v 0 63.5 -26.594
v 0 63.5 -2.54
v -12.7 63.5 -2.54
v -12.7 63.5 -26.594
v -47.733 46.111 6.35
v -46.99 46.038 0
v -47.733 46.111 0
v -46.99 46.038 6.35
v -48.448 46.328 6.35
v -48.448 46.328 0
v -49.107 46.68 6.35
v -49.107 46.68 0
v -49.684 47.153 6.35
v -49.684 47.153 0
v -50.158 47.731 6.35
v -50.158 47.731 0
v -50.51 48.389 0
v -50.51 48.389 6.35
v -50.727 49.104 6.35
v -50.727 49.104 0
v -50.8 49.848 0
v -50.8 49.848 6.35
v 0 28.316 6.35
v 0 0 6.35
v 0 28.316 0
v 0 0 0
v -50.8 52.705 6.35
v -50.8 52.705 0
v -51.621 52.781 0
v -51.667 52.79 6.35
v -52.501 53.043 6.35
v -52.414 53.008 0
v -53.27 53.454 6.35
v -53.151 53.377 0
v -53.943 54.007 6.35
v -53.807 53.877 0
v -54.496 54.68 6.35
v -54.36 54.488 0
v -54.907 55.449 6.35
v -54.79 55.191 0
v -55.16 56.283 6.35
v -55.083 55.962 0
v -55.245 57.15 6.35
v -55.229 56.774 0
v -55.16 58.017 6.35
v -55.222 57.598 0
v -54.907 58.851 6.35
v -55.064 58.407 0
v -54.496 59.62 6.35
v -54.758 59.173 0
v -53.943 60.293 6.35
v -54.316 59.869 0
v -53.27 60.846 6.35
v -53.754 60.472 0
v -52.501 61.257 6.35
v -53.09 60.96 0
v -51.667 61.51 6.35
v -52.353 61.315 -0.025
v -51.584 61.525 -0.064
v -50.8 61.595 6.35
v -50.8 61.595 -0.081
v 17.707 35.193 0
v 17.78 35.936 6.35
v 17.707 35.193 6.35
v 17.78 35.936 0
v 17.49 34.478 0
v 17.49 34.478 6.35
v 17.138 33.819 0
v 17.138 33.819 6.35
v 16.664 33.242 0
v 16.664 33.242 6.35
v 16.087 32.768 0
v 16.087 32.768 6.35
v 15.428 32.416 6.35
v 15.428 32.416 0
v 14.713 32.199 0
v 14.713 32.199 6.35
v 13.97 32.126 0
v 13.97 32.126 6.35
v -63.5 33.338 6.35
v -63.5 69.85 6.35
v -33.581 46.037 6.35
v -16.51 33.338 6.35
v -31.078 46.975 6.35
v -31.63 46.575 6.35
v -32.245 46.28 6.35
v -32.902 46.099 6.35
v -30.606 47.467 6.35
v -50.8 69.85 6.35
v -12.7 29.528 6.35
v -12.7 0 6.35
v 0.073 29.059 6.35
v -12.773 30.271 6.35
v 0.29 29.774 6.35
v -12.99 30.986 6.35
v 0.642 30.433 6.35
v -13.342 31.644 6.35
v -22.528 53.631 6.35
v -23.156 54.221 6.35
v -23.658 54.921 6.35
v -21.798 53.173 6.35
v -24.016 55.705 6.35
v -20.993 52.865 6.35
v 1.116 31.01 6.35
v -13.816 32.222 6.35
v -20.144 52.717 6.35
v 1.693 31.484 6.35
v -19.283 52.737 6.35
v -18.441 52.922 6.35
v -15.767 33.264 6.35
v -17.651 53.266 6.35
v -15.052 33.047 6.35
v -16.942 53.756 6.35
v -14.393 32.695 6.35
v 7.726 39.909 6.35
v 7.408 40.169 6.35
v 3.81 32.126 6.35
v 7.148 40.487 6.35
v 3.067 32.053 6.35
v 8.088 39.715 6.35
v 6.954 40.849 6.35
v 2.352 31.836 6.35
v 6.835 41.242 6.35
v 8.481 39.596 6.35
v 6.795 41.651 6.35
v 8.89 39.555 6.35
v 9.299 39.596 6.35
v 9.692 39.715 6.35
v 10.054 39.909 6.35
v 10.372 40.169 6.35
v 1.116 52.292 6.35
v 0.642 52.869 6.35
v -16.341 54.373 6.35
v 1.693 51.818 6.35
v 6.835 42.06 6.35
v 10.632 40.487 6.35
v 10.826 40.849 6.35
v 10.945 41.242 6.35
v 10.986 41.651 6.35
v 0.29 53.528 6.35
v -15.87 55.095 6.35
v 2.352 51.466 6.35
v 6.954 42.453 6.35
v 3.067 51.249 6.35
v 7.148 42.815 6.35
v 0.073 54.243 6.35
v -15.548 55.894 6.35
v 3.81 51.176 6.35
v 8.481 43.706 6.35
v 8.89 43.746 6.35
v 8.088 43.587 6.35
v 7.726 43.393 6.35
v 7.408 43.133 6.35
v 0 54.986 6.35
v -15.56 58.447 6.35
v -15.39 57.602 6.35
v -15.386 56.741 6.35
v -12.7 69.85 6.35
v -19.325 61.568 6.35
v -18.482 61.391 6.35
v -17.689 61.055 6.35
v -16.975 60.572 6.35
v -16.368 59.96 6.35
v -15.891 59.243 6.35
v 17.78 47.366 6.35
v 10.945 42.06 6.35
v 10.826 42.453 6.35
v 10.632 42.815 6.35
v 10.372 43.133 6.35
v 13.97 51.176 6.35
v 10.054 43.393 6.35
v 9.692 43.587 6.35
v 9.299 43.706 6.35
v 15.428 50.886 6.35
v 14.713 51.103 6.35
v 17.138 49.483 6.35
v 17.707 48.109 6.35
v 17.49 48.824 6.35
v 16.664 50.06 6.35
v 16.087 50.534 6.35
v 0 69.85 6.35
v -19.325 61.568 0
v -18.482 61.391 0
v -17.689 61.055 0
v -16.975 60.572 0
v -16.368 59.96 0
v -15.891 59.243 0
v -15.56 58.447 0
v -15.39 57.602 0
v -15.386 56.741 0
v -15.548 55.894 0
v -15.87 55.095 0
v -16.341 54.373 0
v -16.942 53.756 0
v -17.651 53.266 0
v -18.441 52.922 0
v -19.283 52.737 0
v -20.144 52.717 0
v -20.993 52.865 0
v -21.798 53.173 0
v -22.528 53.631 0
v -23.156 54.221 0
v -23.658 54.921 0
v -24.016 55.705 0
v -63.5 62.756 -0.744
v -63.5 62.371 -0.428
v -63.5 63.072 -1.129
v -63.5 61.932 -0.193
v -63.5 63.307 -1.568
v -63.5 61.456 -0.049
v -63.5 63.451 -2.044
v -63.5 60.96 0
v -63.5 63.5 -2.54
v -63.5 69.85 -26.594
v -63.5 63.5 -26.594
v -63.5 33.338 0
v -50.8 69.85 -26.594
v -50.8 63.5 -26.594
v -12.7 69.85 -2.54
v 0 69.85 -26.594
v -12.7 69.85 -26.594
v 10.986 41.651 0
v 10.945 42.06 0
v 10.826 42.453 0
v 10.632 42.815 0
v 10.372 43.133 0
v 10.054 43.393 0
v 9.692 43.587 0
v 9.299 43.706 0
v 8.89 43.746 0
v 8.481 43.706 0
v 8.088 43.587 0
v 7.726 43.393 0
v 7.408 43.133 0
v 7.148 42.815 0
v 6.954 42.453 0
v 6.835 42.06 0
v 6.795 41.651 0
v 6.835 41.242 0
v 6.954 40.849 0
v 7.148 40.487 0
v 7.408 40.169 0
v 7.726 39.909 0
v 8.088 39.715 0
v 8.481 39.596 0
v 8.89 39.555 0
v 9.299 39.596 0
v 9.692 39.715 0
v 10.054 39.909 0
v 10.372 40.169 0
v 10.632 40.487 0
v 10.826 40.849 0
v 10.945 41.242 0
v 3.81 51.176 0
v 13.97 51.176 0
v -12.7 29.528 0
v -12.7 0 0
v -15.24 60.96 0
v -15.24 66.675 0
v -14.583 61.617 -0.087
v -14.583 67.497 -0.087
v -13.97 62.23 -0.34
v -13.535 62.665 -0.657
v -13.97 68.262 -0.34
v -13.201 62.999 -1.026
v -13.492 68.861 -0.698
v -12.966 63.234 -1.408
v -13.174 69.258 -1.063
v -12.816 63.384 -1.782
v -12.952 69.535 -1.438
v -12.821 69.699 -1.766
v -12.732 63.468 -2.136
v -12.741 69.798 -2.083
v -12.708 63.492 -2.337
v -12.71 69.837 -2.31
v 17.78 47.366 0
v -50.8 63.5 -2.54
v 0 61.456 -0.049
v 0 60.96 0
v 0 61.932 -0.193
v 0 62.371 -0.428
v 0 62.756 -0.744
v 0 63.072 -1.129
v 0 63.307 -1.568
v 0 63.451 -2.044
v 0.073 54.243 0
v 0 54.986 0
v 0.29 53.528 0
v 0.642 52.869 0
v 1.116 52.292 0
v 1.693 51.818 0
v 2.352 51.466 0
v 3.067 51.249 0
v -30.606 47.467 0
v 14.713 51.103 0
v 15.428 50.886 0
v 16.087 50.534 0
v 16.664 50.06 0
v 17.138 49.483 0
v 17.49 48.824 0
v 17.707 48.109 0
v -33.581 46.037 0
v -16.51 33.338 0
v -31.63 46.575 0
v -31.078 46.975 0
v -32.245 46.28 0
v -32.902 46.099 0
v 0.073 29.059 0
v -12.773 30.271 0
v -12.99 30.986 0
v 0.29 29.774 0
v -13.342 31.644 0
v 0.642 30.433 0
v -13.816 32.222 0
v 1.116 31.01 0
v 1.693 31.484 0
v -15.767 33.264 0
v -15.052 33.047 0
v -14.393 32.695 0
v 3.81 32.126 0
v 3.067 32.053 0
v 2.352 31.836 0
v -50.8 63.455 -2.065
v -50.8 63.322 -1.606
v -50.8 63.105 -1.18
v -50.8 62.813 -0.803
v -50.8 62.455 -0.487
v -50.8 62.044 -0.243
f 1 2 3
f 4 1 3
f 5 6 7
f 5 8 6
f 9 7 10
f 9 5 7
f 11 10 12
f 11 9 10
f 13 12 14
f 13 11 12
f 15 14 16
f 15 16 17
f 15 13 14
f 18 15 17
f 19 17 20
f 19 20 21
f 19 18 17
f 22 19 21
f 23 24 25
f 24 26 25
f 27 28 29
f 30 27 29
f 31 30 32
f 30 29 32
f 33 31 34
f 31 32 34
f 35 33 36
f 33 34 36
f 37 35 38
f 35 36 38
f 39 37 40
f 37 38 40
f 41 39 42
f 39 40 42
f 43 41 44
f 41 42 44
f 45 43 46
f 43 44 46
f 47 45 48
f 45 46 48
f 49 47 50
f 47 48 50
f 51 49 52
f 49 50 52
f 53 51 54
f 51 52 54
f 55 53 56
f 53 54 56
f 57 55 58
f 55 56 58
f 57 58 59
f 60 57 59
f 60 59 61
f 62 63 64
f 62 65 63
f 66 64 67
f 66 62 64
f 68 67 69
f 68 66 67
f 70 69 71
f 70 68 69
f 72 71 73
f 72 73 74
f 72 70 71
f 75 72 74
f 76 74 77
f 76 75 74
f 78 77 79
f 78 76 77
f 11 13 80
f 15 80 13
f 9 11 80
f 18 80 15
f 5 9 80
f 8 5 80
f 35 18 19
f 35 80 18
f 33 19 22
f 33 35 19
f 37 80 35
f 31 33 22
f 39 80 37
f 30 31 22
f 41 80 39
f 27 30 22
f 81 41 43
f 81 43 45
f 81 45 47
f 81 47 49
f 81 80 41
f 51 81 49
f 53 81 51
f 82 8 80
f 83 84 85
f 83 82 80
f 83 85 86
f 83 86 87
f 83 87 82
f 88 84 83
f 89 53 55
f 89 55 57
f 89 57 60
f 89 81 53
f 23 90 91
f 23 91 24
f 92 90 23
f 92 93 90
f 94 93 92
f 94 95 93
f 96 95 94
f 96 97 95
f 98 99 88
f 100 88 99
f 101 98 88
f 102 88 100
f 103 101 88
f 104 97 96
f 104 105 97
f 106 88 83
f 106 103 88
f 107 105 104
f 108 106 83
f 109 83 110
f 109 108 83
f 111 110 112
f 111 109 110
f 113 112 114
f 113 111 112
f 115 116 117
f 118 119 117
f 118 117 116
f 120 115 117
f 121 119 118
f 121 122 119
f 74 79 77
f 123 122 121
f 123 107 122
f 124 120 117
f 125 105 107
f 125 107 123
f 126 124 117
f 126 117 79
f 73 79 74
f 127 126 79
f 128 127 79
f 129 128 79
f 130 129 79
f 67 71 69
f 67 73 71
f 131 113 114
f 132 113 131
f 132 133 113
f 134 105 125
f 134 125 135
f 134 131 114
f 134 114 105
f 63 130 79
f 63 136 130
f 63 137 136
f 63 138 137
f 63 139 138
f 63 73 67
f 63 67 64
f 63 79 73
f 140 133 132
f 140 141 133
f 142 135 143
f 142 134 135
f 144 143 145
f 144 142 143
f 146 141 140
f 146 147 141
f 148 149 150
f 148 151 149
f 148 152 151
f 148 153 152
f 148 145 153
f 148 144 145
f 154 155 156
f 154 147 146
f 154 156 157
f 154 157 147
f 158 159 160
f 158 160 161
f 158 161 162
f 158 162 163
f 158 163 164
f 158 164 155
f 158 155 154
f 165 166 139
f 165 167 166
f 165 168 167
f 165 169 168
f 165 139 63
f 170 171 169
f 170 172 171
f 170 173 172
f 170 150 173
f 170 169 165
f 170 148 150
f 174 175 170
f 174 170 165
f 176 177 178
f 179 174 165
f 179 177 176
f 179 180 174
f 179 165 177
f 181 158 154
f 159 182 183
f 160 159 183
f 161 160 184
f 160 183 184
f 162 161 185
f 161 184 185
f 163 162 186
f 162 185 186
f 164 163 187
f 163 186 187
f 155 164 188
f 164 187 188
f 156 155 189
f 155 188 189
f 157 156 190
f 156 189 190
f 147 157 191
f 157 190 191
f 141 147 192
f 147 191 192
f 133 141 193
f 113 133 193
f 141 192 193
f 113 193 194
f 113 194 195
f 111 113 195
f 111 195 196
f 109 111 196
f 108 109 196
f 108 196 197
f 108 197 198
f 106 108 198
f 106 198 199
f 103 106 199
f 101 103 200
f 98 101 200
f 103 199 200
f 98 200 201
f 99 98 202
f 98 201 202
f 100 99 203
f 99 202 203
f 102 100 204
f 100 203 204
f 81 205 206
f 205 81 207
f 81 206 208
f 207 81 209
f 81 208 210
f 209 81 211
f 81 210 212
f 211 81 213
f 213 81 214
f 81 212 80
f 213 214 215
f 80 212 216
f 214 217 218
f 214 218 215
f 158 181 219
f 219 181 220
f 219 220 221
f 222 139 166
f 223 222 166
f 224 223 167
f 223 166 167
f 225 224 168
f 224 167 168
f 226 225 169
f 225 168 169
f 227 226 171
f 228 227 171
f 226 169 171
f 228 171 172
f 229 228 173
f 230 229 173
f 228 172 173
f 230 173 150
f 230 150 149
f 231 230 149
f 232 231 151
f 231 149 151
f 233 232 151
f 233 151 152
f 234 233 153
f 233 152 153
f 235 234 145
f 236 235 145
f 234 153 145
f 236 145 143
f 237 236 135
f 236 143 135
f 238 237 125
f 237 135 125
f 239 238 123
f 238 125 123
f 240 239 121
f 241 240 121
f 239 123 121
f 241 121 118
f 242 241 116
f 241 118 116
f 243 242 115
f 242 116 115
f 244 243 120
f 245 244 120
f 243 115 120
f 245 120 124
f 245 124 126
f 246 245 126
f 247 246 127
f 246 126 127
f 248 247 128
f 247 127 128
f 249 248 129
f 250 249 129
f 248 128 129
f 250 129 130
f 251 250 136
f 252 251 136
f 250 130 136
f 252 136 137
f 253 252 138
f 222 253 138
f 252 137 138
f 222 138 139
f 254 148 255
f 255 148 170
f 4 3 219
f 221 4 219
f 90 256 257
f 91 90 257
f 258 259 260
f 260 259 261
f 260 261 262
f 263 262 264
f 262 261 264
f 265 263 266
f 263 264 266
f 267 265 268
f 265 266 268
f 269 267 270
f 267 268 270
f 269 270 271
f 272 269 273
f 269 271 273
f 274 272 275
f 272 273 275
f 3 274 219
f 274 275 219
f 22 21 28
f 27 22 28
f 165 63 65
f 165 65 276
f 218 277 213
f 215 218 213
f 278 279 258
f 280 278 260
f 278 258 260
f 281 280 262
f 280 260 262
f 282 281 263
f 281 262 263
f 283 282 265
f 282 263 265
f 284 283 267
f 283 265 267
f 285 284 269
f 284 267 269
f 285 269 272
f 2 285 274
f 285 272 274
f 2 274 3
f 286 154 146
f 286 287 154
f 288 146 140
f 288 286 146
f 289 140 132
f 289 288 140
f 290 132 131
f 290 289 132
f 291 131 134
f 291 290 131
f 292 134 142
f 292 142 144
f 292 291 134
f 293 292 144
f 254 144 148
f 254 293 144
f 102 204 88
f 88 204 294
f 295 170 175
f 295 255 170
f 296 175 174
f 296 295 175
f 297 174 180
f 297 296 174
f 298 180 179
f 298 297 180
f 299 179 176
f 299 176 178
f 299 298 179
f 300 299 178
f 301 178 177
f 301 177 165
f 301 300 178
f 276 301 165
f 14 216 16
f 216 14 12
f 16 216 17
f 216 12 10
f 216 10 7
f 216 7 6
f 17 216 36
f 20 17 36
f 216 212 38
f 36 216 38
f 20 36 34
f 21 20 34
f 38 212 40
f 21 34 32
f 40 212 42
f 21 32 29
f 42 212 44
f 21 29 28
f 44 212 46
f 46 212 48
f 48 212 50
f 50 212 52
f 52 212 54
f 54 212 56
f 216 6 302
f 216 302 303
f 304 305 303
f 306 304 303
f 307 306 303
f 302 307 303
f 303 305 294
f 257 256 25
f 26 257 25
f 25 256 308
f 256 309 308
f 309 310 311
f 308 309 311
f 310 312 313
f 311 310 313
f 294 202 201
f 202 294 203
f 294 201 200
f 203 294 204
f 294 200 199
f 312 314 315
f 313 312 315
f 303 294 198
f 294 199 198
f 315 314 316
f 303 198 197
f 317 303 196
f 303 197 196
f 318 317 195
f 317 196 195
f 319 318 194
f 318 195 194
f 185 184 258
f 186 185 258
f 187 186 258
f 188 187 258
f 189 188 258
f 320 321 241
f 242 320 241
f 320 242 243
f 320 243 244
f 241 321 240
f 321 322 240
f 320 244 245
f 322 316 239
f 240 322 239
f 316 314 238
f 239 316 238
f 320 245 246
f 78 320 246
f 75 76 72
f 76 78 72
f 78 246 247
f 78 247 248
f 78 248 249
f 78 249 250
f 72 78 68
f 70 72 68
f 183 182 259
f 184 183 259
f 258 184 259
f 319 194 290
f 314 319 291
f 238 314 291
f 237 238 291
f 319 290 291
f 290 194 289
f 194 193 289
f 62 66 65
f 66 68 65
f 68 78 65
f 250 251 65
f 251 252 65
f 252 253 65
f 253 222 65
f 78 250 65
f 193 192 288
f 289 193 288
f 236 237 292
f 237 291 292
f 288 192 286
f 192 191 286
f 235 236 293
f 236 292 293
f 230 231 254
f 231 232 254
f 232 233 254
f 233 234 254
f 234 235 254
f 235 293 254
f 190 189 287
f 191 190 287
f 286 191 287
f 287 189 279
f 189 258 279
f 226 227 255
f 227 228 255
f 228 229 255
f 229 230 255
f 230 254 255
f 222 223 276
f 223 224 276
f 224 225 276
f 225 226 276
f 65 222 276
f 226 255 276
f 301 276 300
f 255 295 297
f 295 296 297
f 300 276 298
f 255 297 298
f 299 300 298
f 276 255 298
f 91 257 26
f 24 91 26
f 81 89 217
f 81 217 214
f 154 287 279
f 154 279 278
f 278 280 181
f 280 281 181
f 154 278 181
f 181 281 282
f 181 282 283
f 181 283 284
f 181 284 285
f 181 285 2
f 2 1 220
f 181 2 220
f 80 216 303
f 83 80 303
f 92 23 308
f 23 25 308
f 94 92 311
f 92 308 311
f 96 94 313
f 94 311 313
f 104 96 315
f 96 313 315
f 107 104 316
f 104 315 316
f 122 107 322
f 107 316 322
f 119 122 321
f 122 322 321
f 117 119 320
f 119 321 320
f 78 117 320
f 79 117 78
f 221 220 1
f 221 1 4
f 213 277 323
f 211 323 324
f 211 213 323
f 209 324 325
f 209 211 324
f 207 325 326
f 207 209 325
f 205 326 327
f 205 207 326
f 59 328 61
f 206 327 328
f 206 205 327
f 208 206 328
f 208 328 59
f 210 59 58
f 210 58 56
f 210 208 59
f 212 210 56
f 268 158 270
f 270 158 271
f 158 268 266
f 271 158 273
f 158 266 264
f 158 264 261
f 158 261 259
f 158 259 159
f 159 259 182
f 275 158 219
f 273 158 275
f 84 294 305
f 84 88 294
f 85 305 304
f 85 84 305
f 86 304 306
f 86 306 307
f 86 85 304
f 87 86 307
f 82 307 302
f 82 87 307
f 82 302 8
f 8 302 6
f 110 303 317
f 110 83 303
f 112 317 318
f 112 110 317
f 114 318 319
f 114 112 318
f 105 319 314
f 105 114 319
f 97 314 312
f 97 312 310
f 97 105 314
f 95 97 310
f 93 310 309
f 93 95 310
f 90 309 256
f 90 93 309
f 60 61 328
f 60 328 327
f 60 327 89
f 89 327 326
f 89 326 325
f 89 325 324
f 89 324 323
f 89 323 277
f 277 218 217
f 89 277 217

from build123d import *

# Parameters (mm, degrees)
BOSS_EXTRUDE1_DEPTH = 6.35
SKETCH2_W           = 12.7
SKETCH2_H           = 6.35
BOSS_EXTRUDE3_DEPTH = 32.9438
FILLET1_R           = 2.54
SKETCH3_W           = 17.78
SKETCH3_H           = 19.05
SKETCH3_R           = 2.0955
BOSS_EXTRUDE4_DEPTH = 6.35
FILLET2_R           = 3.81


with BuildPart() as part:
    # Sketch1 → Boss-Extrude1 (new body)
    with BuildSketch(Plane.XY):
        with BuildLine():
            Line((0, 0), (0, 69.85))
            Line((0, 69.85), (-12.7, 69.85))
            Line((-12.7, 69.85), (-19.325374009, 61.568282488))
            ThreePointArc((-19.325374009, 61.568282488), (-16.341038142, 54.373230514), (-24.015699161, 55.705376048))
            Line((-24.015699161, 55.705376048), (-31.75, 46.0375))
            Line((-31.75, 46.0375), (-50.8, 46.0375))
            Line((-50.8, 46.0375), (-50.8, 52.705))
            ThreePointArc((-50.8, 52.705), (-55.245, 57.15), (-50.8, 61.595))
            Line((-50.8, 61.595), (-50.8, 69.85))
            Line((-50.8, 69.85), (-63.5, 69.85))
            Line((-63.5, 69.85), (-63.5, 33.3375))
            Line((-63.5, 33.3375), (-12.7, 33.3375))
            Line((-12.7, 33.3375), (-12.7, 0))
            Line((-12.7, 0), (0, 0))
        make_face()
    extrude(amount=BOSS_EXTRUDE1_DEPTH)

    # Sketch2 → Boss-Extrude3 (add)
    with BuildSketch(Plane(origin=(0, 0, 6.35), x_dir=(-1, 0, 0), z_dir=(0, 0, -1))):
        with Locations((6.35, 66.675)):
            Rectangle(SKETCH2_W, SKETCH2_H)
        with Locations((57.15, 66.675)):
            Rectangle(SKETCH2_W, SKETCH2_H)
    extrude(amount=BOSS_EXTRUDE3_DEPTH)

    # Fillet1
    fillet1_edges = [part.edges().sort_by_distance(p)[0] for p in [
        (-57.15, 63.5, 0),
        (-6.35, 63.5, 0),
        (-12.7, 66.675, 0),
    ]]
    fillet(fillet1_edges, radius=FILLET1_R)

    # Sketch3 → Boss-Extrude4 (add)
    with BuildSketch(Plane.XY.offset(6.35)):
        with Locations((8.89, 41.65092)):
            Rectangle(SKETCH3_W, SKETCH3_H)
        with Locations((8.89, 41.65092)):
            Circle(SKETCH3_R, mode=Mode.SUBTRACT)
    extrude(amount=-BOSS_EXTRUDE4_DEPTH)

    # Fillet2
    fillet2_edges = [part.edges().sort_by_distance(p)[0] for p in [
        (17.78, 32.12592, 3.175),
        (17.78, 51.17592, 3.175),
        (0, 51.17592, 3.175),
        (0, 32.12592, 3.175),
        (-12.7, 33.3375, 3.175),
        (-50.8, 46.0375, 3.175),
        (-31.75, 46.0375, 3.175),
    ]]
    fillet(fillet2_edges, radius=FILLET2_R)


solid = part.part
